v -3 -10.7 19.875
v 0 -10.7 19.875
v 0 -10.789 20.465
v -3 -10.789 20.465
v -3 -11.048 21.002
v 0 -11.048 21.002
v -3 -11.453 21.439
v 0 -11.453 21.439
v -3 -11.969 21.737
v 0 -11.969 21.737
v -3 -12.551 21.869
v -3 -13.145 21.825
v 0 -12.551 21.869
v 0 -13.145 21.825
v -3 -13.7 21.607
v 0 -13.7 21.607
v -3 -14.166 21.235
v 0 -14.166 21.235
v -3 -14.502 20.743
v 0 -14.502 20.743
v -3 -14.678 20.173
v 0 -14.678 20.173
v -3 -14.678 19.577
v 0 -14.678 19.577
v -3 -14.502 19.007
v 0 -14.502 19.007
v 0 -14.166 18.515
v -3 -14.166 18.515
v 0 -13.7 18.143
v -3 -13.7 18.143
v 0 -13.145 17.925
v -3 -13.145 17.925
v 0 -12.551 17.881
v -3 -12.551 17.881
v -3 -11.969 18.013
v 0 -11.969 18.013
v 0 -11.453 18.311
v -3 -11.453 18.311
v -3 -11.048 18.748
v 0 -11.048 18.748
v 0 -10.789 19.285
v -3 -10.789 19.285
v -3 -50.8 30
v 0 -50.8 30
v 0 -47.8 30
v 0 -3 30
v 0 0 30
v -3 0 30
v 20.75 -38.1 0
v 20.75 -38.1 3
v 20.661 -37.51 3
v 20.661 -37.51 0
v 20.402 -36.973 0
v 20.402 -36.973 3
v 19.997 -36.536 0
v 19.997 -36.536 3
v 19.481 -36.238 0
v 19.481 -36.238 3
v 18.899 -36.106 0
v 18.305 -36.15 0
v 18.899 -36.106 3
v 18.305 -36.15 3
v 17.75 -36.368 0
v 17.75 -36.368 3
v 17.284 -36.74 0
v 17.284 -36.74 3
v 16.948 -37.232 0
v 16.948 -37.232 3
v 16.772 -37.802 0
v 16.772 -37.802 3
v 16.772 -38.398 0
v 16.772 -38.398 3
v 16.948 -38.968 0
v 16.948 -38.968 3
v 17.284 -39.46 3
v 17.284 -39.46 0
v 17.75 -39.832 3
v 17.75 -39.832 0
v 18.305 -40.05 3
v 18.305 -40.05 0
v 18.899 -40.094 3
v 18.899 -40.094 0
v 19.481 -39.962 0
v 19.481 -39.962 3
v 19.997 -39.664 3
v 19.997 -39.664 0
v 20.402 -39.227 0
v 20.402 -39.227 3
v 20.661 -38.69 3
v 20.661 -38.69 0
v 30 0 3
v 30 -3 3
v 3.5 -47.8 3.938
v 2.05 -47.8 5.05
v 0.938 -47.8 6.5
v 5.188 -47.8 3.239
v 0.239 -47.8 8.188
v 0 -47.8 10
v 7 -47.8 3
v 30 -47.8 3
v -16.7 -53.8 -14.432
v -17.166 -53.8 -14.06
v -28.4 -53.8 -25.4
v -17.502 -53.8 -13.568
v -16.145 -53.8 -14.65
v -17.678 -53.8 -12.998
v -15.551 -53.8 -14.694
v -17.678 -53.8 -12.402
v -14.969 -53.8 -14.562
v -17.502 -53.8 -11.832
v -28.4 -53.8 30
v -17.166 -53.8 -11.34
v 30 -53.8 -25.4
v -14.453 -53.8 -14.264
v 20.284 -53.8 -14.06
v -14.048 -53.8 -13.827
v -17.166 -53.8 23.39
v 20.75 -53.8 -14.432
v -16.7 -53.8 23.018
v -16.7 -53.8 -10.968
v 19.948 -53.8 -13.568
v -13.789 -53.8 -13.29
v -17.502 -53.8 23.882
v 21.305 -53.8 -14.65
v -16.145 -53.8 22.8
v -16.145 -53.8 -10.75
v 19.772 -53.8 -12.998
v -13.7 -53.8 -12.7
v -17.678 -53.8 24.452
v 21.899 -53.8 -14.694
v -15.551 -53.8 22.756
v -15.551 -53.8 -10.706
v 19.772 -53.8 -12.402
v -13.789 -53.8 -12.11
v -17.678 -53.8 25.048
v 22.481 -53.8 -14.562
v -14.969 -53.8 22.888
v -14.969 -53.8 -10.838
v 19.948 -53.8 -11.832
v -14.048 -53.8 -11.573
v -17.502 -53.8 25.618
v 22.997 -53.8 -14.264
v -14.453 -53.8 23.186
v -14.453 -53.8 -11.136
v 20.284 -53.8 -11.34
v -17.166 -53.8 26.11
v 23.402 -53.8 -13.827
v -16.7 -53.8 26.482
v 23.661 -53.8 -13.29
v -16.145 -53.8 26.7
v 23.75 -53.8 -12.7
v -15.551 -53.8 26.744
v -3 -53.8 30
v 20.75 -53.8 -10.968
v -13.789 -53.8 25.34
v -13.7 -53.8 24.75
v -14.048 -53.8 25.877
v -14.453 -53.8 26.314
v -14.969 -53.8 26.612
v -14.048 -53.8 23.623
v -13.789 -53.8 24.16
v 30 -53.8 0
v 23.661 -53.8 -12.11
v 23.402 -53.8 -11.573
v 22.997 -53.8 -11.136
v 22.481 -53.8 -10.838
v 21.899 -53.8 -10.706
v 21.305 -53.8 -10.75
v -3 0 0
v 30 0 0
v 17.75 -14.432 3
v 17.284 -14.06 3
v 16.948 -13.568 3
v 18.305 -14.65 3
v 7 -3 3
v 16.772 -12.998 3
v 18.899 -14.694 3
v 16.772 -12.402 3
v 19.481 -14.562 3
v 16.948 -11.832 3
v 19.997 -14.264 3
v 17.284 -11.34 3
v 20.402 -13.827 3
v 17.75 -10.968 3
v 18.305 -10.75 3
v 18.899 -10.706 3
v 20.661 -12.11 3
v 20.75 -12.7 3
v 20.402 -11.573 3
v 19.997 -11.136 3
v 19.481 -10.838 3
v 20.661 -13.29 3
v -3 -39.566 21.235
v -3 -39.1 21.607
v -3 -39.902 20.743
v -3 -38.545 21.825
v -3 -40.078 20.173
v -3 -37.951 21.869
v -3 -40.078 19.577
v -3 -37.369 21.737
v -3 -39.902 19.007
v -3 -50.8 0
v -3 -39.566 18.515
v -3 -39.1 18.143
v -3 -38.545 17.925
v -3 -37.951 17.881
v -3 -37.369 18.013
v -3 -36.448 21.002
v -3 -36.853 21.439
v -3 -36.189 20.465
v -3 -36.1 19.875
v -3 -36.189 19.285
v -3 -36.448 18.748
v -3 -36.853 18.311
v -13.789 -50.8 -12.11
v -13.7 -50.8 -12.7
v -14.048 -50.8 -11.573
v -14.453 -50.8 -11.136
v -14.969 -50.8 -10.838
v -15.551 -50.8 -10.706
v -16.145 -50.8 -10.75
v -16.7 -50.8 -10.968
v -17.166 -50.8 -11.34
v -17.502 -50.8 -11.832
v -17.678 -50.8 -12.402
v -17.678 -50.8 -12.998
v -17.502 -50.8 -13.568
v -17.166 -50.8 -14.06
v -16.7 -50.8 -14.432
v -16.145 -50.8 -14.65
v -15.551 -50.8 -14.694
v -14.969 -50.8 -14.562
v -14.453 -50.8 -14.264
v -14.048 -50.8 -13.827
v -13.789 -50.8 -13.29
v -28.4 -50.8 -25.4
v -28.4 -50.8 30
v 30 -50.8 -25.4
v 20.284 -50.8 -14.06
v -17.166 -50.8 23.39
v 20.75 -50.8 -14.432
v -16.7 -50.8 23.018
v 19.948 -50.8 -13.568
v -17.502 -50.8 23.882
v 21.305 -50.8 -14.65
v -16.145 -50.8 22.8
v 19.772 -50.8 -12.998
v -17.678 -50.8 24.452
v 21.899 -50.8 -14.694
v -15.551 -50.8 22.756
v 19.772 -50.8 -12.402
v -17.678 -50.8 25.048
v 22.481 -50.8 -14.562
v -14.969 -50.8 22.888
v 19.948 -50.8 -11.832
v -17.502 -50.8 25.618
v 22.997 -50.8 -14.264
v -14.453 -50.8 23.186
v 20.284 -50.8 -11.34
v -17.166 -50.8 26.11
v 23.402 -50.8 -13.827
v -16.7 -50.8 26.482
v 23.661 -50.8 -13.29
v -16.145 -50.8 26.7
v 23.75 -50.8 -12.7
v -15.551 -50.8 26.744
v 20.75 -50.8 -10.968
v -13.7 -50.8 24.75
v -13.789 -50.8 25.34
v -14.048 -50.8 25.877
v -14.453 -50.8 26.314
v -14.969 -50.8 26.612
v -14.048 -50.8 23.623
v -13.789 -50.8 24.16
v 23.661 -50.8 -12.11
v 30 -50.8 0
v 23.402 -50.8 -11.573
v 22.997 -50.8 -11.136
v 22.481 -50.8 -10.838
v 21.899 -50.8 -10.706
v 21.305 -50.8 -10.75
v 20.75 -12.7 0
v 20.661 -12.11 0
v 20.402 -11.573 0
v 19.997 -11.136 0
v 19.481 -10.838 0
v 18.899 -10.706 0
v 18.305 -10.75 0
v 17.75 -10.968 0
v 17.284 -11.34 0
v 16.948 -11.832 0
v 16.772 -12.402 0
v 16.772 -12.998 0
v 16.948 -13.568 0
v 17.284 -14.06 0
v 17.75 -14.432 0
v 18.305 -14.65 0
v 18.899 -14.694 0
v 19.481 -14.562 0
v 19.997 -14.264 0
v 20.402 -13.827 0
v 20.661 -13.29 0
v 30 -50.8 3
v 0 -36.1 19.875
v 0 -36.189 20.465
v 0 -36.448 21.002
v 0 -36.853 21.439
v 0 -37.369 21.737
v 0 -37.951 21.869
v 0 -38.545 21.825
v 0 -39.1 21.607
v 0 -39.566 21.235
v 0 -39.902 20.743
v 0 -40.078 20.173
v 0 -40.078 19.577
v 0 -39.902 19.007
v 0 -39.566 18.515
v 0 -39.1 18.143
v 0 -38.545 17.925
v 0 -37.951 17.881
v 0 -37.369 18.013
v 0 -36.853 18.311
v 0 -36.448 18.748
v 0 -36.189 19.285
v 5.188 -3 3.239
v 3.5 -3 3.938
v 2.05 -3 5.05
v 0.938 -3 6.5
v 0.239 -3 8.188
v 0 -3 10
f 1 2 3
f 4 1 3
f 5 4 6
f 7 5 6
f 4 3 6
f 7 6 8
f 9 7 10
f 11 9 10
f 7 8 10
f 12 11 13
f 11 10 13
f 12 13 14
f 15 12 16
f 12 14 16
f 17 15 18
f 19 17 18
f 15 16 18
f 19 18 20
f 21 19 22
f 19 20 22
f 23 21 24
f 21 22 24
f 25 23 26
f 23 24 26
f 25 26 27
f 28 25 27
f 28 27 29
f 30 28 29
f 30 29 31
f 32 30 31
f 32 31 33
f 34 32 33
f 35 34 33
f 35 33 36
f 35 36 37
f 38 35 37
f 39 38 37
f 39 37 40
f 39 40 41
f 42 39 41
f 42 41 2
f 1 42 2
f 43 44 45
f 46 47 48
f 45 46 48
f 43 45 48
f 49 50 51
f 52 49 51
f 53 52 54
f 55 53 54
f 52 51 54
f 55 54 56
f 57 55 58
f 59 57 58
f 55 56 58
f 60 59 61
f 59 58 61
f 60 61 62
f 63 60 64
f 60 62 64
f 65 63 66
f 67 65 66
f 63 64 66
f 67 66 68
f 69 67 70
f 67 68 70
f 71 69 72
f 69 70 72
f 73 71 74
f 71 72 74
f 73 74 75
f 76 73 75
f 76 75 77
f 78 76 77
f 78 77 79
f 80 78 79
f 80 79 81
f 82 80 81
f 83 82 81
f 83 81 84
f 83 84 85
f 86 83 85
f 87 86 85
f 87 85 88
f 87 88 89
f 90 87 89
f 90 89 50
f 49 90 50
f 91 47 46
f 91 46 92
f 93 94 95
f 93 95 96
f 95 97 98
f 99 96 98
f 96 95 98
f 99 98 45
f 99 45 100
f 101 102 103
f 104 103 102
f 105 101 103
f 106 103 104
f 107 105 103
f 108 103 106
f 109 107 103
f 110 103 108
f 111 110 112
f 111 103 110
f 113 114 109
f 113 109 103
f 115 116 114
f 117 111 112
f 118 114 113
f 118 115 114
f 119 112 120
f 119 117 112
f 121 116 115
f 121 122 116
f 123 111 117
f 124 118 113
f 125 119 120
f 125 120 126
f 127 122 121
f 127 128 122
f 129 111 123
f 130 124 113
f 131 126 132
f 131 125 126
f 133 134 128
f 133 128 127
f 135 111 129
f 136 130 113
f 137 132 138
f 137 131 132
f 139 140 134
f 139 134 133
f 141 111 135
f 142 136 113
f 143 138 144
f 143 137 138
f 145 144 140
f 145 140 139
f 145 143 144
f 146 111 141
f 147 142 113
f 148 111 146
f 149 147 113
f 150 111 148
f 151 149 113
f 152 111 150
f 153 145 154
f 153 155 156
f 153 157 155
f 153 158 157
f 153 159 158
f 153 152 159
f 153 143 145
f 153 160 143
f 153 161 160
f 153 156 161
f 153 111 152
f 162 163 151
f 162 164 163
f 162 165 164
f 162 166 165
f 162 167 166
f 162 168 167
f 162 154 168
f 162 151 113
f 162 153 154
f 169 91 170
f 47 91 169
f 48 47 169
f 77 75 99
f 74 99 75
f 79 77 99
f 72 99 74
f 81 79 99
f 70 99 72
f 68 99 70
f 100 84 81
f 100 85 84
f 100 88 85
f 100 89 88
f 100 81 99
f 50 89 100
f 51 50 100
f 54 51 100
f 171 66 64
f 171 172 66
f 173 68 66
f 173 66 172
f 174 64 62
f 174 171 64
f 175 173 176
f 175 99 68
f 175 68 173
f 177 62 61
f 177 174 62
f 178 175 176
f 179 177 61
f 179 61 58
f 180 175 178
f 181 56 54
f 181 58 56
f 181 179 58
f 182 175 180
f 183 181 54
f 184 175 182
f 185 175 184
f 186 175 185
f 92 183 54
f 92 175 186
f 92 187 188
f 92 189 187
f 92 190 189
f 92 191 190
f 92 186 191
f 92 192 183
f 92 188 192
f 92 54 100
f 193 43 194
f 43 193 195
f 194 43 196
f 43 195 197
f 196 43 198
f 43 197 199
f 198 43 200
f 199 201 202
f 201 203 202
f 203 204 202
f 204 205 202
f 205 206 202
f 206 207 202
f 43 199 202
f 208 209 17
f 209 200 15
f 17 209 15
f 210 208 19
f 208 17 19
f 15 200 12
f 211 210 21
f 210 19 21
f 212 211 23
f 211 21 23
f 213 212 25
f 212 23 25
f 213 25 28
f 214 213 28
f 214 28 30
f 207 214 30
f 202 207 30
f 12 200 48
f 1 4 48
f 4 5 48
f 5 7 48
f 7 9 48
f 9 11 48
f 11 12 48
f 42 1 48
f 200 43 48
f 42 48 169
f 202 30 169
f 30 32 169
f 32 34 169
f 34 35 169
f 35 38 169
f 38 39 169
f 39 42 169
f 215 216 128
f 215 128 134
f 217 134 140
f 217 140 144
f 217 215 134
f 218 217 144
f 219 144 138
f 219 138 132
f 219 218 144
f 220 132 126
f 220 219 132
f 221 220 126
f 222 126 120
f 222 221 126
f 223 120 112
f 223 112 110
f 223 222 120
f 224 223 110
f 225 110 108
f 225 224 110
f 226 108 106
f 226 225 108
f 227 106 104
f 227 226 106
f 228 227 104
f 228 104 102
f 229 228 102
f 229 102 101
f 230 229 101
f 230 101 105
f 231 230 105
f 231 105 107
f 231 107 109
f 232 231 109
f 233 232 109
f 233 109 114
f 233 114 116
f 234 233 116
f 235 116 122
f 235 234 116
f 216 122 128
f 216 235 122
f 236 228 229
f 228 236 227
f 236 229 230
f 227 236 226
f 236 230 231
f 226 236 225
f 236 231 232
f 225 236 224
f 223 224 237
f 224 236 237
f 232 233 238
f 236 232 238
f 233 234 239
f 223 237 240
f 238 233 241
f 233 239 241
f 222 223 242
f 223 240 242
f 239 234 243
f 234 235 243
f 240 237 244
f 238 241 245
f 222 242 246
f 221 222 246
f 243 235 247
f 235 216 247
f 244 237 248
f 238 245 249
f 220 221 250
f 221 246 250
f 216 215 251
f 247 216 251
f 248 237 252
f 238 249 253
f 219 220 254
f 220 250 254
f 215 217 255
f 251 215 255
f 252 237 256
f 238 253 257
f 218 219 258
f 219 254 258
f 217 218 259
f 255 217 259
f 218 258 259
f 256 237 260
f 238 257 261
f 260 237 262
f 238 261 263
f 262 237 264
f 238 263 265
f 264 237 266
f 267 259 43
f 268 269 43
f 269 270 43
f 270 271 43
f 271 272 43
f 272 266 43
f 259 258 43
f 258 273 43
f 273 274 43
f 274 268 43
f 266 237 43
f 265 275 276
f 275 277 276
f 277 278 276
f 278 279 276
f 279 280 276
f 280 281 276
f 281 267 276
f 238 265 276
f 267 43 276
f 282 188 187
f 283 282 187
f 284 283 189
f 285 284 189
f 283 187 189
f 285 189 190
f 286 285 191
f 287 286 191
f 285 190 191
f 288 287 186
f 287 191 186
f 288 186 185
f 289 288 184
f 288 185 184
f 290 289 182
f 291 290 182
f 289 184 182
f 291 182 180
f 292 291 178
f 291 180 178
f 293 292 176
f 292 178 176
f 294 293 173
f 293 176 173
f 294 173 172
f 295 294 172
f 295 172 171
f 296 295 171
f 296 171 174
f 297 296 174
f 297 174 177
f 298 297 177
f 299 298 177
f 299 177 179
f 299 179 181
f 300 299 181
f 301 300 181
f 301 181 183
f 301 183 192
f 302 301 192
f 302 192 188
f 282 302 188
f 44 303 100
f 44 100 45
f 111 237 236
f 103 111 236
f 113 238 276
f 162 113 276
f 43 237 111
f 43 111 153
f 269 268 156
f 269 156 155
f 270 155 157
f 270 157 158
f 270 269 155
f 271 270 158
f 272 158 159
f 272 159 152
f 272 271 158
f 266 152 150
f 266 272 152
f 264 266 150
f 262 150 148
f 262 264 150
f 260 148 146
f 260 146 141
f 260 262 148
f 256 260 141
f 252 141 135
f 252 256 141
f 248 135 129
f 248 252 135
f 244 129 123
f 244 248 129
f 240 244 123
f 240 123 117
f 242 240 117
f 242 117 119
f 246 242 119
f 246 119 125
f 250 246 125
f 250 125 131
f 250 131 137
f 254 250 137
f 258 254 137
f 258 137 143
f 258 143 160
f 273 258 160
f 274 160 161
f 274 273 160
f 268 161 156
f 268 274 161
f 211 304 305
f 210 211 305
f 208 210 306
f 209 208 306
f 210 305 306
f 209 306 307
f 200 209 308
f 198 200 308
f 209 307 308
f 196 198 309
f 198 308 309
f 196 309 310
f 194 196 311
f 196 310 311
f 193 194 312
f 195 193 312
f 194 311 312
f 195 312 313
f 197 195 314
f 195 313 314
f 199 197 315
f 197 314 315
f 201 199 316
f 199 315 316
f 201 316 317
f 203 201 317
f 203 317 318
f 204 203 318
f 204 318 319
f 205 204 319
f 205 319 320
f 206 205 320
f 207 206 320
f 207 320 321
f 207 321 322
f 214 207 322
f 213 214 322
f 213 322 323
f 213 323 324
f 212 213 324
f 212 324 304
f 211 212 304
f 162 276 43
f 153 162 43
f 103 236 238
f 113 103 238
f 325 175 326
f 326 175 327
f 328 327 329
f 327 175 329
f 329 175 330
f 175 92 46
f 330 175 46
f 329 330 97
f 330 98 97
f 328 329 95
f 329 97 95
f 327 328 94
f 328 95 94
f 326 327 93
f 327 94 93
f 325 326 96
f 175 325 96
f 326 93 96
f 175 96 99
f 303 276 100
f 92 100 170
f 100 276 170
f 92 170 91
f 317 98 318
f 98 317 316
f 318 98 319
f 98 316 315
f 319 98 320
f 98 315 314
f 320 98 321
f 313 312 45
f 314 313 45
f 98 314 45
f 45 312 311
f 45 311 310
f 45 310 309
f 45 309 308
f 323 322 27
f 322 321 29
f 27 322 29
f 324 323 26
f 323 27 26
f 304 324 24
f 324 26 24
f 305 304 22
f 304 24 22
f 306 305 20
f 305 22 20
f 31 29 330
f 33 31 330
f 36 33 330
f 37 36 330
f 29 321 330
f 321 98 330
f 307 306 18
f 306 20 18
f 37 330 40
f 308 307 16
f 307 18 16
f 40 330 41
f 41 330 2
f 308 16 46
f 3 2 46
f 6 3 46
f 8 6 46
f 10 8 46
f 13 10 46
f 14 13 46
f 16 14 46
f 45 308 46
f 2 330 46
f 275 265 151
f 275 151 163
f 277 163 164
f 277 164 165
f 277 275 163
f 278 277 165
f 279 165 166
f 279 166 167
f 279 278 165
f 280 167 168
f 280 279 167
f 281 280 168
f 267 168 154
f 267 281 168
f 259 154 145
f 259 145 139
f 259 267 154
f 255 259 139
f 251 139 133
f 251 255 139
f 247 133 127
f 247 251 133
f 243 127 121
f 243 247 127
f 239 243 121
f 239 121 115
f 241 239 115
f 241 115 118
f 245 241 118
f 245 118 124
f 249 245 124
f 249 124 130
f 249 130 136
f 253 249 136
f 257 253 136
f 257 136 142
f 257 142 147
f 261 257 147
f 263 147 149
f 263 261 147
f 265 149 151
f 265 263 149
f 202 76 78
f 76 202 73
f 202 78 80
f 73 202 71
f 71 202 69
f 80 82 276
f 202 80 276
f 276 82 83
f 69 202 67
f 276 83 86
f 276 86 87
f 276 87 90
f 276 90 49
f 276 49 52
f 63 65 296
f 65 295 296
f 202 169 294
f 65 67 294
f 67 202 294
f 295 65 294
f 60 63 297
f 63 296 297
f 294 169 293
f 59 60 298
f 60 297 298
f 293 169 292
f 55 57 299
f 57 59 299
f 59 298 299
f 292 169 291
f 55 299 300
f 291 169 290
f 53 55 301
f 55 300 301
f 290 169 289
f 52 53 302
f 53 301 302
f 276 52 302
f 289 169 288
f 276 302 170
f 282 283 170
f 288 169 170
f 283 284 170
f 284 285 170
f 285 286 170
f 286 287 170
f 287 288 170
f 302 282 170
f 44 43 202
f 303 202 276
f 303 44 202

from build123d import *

# Parameters (mm, degrees)
F0_W      = 30
F0_H      = 3
F1_DEPTH  = 50.8
F2_R      = 2
F3_DEPTH  = 3.001
F4_R      = 2
F5_DEPTH  = 3.001
F7_DEPTH  = 3
F9_DEPTH  = 3
F10_R     = 7
F11_W     = 25.4
F11_H     = 30
F11_R     = 2
F11_W_2   = 33
F11_H_2   = 25.4
F12_DEPTH = 3


with BuildPart() as f1:
    # F0 (on Front) → F1 (new body)
    with BuildSketch(Plane.XZ):
        with Locations((15, 1.5)):
            Rectangle(F0_W, F0_H)
        Polygon((-3, 0), (0, 0), (0, 3), (0, 30), (-3, 30), align=None)
    extrude(amount=F1_DEPTH)

    # F2 (on face) → F3 (cut, through all)
    with BuildSketch(Plane.XY.offset(3)):
        with Locations((18.75, -12.7)):
            Circle(F2_R)
        with Locations((18.75, -38.1)):
            Circle(F2_R)
    extrude(amount=-F3_DEPTH, mode=Mode.SUBTRACT)

    # F4 (on face) → F5 (cut, through all)
    with BuildSketch(Plane.YZ):
        with Locations((-38.1, 19.875)):
            Circle(F4_R)
        with Locations((-12.7, 19.875)):
            Circle(F4_R)
    extrude(amount=-F5_DEPTH, mode=Mode.SUBTRACT)

    # F6 (on face) → F7 (join)
    with BuildSketch(Plane.XZ.offset(50.8)):
        Polygon((30, 3), (0, 30), (0, 3), align=None)
    extrude(amount=-F7_DEPTH)

    # F8 (on face) → F9 (join)
    with BuildSketch(Plane(origin=(0, 0, 0), x_dir=(-1, 0, 0), z_dir=(0, 1, 0))):
        Polygon((0, 30), (-30, 3), (0, 3), align=None)
    extrude(amount=-F9_DEPTH)

    # F10
    f10_edges = [f1.edges().sort_by_distance(p)[0] for p in [
        (0, -25.4, 3),
    ]]
    fillet(f10_edges, radius=F10_R)


with BuildPart() as f12:
    # F11 (on face) → F12 (new body)
    with BuildSketch(Plane.XZ.offset(50.8)):
        with Locations((-15.7, 15)):
            Rectangle(F11_W, F11_H)
        with Locations((-15.7, 24.75)):
            Circle(F11_R, mode=Mode.SUBTRACT)
        Polygon((30, 0), (-3, 30), (-3, 0), align=None)
        with Locations((13.5, -12.7)):
            Rectangle(F11_W_2, F11_H_2)
        with Locations((21.75, -12.7)):
            Circle(F11_R, mode=Mode.SUBTRACT)
        with Locations((-15.7, -12.7)):
            Rectangle(F11_W, F11_H_2)
        with Locations((-15.7, -12.7)):
            Circle(F11_R, mode=Mode.SUBTRACT)
    extrude(amount=F12_DEPTH)


solid = Compound([f1.part, f12.part])
